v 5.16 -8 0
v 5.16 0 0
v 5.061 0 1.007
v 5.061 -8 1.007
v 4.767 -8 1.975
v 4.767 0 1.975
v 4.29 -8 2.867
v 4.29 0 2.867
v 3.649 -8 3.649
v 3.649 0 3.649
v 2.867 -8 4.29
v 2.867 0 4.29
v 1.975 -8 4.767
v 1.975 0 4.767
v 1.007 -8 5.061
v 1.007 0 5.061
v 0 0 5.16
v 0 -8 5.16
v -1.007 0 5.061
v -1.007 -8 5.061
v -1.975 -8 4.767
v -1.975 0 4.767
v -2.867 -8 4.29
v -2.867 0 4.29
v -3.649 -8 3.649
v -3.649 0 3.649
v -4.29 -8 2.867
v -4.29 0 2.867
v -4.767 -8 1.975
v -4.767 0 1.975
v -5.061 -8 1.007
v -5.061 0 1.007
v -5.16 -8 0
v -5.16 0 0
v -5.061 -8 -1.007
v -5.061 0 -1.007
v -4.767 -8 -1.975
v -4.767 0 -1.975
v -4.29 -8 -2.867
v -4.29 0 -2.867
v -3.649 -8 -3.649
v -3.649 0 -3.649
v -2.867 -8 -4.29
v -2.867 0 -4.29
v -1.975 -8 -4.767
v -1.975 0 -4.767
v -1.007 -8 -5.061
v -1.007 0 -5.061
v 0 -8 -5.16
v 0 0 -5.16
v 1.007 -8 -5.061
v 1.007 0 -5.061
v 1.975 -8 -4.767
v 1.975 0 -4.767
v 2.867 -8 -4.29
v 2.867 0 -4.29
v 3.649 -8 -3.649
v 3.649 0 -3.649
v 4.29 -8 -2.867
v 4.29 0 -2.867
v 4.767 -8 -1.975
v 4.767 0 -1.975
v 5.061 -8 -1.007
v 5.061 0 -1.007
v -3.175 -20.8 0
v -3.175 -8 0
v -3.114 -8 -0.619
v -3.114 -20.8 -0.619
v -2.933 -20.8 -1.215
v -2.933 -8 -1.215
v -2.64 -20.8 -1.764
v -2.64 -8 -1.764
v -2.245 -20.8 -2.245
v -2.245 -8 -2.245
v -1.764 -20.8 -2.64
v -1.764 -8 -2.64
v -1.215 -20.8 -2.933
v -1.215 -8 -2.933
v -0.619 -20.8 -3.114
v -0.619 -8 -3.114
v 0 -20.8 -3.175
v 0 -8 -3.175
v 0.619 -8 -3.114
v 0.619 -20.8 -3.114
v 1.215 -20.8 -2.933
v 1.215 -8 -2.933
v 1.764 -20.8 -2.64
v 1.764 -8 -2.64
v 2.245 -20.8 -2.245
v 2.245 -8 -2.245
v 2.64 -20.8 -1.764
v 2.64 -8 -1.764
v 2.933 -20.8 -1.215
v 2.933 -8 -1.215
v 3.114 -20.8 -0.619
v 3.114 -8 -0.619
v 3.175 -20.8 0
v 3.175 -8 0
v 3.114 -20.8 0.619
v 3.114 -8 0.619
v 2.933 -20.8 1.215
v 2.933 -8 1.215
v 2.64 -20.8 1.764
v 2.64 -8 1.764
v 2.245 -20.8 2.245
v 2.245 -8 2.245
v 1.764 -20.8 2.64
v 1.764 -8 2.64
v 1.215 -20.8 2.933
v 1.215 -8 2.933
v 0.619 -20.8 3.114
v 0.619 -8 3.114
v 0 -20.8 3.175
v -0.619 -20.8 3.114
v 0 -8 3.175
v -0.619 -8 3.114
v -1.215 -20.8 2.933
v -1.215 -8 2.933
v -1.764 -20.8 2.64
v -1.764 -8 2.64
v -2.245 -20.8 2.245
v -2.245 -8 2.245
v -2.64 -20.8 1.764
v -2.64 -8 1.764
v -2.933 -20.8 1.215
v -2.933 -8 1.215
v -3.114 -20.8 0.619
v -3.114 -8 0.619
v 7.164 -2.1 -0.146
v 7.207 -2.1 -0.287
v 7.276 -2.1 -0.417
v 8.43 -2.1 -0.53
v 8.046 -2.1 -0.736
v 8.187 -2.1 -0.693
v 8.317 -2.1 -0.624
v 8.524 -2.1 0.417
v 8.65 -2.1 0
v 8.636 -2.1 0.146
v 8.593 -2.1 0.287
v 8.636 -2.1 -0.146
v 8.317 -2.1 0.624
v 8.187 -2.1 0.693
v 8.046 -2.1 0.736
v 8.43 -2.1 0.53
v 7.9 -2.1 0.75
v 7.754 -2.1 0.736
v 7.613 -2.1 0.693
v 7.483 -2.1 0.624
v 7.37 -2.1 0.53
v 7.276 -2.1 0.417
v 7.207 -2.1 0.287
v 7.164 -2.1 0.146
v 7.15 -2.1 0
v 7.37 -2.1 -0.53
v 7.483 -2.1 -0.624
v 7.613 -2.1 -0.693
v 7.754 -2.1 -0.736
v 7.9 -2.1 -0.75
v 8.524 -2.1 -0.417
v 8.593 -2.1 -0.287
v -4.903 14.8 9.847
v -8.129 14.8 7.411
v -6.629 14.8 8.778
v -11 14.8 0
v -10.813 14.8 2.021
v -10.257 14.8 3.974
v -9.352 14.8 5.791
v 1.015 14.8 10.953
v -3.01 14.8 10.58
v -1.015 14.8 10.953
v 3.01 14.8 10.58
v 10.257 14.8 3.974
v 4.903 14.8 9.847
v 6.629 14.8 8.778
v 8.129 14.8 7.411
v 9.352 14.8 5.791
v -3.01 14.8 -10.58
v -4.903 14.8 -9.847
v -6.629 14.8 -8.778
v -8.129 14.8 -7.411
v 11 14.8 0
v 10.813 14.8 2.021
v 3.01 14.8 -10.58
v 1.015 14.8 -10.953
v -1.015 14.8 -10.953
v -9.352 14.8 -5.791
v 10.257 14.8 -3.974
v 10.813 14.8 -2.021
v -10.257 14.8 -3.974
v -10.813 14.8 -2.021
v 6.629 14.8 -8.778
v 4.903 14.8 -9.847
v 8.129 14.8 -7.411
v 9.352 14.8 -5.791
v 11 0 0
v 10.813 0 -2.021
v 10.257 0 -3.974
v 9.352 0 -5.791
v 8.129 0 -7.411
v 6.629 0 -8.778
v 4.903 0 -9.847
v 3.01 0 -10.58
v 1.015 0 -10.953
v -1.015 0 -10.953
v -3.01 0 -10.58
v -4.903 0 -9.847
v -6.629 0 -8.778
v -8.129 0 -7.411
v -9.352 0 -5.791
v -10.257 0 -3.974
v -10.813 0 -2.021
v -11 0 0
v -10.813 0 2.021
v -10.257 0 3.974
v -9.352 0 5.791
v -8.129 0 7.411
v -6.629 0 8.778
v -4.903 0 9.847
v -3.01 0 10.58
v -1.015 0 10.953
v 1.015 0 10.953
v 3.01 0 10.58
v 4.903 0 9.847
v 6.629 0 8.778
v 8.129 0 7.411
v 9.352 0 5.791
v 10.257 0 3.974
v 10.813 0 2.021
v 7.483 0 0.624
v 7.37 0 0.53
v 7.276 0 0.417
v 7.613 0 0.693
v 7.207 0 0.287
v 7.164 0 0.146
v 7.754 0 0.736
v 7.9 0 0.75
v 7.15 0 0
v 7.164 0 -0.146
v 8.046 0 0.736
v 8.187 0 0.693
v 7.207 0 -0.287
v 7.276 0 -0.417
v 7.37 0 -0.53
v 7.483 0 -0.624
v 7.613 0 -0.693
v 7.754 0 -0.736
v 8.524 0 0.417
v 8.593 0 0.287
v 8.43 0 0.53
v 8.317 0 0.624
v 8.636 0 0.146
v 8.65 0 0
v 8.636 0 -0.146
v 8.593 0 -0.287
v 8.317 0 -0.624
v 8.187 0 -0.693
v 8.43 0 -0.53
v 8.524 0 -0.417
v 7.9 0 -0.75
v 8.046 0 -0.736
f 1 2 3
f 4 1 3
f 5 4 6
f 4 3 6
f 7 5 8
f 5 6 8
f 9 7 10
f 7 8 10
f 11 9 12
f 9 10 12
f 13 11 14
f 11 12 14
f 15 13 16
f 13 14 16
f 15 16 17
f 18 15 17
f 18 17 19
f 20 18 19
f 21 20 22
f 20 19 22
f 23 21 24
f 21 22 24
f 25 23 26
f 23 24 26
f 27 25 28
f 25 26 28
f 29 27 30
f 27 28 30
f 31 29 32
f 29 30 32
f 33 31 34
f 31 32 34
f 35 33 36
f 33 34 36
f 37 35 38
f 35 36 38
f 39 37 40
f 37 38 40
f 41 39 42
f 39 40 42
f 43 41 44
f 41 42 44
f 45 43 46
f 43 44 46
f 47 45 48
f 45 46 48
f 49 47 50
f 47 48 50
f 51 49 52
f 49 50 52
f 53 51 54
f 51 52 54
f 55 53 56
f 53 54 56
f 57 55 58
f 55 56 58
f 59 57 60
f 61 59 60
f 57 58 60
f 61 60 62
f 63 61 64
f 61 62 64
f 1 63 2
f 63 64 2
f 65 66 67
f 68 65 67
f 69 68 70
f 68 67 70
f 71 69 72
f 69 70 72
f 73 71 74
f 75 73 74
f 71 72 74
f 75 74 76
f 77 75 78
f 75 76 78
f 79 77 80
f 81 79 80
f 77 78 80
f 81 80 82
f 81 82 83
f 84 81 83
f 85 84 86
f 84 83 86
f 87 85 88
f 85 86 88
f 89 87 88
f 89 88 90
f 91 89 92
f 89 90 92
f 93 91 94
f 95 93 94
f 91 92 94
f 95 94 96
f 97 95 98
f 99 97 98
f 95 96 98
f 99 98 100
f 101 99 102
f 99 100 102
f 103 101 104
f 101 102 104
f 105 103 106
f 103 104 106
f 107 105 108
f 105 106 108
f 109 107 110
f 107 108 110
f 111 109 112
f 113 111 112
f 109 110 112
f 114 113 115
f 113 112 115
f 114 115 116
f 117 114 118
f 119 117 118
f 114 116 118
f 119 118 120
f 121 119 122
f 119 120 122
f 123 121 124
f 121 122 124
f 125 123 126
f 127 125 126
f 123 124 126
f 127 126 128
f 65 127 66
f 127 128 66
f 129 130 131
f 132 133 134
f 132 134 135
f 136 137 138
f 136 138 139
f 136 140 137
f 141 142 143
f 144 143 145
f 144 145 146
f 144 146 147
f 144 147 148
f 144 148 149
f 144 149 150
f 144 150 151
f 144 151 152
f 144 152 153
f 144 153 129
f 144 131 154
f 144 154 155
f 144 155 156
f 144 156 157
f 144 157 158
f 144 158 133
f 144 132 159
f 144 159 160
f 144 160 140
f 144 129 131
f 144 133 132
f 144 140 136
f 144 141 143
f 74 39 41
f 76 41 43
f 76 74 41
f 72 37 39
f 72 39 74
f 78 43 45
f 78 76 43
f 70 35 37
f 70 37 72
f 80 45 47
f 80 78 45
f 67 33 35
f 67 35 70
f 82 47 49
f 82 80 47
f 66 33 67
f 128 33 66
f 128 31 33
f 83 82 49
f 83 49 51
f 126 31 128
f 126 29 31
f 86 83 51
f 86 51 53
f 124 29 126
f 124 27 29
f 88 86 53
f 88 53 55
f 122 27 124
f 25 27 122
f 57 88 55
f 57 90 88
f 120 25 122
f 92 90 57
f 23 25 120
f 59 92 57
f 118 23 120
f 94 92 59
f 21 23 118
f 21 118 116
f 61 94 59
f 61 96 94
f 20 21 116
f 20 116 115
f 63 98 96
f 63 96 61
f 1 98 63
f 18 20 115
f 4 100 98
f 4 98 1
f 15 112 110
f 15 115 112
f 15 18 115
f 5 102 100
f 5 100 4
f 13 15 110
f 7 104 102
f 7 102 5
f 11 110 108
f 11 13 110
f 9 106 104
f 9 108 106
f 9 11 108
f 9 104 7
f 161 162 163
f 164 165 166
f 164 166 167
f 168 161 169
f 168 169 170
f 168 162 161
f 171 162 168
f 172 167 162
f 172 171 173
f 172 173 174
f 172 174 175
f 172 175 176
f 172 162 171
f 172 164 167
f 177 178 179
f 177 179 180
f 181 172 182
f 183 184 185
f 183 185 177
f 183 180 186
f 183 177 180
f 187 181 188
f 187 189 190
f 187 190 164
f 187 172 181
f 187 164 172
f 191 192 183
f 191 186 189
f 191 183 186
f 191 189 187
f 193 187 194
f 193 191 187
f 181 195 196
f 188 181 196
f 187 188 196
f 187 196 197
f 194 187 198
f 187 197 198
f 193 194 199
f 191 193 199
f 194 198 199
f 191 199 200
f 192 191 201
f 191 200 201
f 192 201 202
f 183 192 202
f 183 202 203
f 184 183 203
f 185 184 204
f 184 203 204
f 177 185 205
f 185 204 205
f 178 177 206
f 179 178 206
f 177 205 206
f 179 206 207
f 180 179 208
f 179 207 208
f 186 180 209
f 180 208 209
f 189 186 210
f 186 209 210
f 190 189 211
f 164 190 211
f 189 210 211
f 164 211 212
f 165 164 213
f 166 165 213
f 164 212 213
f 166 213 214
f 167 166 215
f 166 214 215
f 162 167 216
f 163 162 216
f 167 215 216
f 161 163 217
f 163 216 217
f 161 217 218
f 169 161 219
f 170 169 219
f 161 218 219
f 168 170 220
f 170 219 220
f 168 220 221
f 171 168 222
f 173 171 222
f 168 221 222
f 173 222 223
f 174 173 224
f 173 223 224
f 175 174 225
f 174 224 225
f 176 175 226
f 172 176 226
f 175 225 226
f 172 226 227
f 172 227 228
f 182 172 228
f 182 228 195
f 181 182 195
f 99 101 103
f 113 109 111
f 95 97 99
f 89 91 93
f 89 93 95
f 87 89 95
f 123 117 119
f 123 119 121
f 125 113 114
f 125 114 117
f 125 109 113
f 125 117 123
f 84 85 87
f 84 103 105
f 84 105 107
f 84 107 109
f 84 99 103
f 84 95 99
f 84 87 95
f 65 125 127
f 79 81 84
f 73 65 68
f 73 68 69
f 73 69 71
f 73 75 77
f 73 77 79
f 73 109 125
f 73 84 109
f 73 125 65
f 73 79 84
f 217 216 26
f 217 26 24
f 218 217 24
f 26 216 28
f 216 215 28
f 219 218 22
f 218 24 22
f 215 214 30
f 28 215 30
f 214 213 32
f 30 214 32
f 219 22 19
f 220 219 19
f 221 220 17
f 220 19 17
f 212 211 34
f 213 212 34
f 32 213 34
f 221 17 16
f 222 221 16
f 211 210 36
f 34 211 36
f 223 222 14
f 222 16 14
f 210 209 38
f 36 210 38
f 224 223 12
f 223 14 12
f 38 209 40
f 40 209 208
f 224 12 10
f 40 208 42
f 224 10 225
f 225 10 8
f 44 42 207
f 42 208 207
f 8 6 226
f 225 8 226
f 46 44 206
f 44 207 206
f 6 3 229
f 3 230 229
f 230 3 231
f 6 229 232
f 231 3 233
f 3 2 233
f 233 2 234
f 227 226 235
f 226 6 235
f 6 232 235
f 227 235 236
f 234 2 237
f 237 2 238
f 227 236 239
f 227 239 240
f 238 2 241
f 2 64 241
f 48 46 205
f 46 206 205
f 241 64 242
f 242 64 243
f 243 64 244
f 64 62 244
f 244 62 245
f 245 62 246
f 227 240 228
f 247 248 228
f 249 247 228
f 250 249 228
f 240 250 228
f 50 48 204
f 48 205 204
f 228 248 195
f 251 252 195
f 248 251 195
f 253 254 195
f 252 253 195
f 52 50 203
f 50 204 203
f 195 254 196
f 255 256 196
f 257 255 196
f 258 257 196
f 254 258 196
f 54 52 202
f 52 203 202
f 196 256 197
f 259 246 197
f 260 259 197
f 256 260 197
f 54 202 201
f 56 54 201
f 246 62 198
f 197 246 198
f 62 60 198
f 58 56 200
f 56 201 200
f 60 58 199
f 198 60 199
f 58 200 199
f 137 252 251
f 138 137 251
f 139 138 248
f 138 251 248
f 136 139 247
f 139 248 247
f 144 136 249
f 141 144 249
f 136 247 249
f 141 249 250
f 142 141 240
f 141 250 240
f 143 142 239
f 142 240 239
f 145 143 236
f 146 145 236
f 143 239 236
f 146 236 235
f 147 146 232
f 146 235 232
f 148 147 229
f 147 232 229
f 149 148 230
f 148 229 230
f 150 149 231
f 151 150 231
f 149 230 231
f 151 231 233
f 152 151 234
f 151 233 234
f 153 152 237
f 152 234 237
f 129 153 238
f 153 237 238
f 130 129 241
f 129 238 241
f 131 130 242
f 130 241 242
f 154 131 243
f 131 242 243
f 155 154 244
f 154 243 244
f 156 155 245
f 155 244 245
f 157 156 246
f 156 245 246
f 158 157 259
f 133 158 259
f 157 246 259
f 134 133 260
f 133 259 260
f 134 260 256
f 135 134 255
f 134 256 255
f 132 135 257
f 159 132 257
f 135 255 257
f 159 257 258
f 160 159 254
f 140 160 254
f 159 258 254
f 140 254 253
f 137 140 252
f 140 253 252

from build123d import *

# Parameters (mm, degrees)
SKETCH1_R           = 11
BOSS_EXTRUDE1_DEPTH = 14.8
SKETCH2_R           = 5.16
BOSS_EXTRUDE2_DEPTH = 8
SKETCH3_R           = 3.175
BOSS_EXTRUDE3_DEPTH = 12.8
SKETCH4_R           = 0.75
BOSS_EXTRUDE4_DEPTH = 2.1


with BuildPart() as part:
    # Sketch1 → Boss-Extrude1 (new body)
    with BuildSketch(Plane(origin=(0, 0, 0), x_dir=(1, 0, 0), z_dir=(0, 1, 0))):
        Circle(SKETCH1_R)
    extrude(amount=BOSS_EXTRUDE1_DEPTH)

    # Sketch2 → Boss-Extrude2 (add)
    with BuildSketch(Plane.XZ):
        Circle(SKETCH2_R)
    extrude(amount=BOSS_EXTRUDE2_DEPTH)

    # Sketch3 → Boss-Extrude3 (add)
    with BuildSketch(Plane(origin=(0, -8, 0), x_dir=(-1, 0, 0), z_dir=(0, -1, 0))):
        Circle(SKETCH3_R)
    extrude(amount=BOSS_EXTRUDE3_DEPTH)

    # Sketch4 → Boss-Extrude4 (add)
    with BuildSketch(Plane.XZ):
        with Locations((7.9, 0)):
            Circle(SKETCH4_R)
    extrude(amount=BOSS_EXTRUDE4_DEPTH)


solid = part.part
